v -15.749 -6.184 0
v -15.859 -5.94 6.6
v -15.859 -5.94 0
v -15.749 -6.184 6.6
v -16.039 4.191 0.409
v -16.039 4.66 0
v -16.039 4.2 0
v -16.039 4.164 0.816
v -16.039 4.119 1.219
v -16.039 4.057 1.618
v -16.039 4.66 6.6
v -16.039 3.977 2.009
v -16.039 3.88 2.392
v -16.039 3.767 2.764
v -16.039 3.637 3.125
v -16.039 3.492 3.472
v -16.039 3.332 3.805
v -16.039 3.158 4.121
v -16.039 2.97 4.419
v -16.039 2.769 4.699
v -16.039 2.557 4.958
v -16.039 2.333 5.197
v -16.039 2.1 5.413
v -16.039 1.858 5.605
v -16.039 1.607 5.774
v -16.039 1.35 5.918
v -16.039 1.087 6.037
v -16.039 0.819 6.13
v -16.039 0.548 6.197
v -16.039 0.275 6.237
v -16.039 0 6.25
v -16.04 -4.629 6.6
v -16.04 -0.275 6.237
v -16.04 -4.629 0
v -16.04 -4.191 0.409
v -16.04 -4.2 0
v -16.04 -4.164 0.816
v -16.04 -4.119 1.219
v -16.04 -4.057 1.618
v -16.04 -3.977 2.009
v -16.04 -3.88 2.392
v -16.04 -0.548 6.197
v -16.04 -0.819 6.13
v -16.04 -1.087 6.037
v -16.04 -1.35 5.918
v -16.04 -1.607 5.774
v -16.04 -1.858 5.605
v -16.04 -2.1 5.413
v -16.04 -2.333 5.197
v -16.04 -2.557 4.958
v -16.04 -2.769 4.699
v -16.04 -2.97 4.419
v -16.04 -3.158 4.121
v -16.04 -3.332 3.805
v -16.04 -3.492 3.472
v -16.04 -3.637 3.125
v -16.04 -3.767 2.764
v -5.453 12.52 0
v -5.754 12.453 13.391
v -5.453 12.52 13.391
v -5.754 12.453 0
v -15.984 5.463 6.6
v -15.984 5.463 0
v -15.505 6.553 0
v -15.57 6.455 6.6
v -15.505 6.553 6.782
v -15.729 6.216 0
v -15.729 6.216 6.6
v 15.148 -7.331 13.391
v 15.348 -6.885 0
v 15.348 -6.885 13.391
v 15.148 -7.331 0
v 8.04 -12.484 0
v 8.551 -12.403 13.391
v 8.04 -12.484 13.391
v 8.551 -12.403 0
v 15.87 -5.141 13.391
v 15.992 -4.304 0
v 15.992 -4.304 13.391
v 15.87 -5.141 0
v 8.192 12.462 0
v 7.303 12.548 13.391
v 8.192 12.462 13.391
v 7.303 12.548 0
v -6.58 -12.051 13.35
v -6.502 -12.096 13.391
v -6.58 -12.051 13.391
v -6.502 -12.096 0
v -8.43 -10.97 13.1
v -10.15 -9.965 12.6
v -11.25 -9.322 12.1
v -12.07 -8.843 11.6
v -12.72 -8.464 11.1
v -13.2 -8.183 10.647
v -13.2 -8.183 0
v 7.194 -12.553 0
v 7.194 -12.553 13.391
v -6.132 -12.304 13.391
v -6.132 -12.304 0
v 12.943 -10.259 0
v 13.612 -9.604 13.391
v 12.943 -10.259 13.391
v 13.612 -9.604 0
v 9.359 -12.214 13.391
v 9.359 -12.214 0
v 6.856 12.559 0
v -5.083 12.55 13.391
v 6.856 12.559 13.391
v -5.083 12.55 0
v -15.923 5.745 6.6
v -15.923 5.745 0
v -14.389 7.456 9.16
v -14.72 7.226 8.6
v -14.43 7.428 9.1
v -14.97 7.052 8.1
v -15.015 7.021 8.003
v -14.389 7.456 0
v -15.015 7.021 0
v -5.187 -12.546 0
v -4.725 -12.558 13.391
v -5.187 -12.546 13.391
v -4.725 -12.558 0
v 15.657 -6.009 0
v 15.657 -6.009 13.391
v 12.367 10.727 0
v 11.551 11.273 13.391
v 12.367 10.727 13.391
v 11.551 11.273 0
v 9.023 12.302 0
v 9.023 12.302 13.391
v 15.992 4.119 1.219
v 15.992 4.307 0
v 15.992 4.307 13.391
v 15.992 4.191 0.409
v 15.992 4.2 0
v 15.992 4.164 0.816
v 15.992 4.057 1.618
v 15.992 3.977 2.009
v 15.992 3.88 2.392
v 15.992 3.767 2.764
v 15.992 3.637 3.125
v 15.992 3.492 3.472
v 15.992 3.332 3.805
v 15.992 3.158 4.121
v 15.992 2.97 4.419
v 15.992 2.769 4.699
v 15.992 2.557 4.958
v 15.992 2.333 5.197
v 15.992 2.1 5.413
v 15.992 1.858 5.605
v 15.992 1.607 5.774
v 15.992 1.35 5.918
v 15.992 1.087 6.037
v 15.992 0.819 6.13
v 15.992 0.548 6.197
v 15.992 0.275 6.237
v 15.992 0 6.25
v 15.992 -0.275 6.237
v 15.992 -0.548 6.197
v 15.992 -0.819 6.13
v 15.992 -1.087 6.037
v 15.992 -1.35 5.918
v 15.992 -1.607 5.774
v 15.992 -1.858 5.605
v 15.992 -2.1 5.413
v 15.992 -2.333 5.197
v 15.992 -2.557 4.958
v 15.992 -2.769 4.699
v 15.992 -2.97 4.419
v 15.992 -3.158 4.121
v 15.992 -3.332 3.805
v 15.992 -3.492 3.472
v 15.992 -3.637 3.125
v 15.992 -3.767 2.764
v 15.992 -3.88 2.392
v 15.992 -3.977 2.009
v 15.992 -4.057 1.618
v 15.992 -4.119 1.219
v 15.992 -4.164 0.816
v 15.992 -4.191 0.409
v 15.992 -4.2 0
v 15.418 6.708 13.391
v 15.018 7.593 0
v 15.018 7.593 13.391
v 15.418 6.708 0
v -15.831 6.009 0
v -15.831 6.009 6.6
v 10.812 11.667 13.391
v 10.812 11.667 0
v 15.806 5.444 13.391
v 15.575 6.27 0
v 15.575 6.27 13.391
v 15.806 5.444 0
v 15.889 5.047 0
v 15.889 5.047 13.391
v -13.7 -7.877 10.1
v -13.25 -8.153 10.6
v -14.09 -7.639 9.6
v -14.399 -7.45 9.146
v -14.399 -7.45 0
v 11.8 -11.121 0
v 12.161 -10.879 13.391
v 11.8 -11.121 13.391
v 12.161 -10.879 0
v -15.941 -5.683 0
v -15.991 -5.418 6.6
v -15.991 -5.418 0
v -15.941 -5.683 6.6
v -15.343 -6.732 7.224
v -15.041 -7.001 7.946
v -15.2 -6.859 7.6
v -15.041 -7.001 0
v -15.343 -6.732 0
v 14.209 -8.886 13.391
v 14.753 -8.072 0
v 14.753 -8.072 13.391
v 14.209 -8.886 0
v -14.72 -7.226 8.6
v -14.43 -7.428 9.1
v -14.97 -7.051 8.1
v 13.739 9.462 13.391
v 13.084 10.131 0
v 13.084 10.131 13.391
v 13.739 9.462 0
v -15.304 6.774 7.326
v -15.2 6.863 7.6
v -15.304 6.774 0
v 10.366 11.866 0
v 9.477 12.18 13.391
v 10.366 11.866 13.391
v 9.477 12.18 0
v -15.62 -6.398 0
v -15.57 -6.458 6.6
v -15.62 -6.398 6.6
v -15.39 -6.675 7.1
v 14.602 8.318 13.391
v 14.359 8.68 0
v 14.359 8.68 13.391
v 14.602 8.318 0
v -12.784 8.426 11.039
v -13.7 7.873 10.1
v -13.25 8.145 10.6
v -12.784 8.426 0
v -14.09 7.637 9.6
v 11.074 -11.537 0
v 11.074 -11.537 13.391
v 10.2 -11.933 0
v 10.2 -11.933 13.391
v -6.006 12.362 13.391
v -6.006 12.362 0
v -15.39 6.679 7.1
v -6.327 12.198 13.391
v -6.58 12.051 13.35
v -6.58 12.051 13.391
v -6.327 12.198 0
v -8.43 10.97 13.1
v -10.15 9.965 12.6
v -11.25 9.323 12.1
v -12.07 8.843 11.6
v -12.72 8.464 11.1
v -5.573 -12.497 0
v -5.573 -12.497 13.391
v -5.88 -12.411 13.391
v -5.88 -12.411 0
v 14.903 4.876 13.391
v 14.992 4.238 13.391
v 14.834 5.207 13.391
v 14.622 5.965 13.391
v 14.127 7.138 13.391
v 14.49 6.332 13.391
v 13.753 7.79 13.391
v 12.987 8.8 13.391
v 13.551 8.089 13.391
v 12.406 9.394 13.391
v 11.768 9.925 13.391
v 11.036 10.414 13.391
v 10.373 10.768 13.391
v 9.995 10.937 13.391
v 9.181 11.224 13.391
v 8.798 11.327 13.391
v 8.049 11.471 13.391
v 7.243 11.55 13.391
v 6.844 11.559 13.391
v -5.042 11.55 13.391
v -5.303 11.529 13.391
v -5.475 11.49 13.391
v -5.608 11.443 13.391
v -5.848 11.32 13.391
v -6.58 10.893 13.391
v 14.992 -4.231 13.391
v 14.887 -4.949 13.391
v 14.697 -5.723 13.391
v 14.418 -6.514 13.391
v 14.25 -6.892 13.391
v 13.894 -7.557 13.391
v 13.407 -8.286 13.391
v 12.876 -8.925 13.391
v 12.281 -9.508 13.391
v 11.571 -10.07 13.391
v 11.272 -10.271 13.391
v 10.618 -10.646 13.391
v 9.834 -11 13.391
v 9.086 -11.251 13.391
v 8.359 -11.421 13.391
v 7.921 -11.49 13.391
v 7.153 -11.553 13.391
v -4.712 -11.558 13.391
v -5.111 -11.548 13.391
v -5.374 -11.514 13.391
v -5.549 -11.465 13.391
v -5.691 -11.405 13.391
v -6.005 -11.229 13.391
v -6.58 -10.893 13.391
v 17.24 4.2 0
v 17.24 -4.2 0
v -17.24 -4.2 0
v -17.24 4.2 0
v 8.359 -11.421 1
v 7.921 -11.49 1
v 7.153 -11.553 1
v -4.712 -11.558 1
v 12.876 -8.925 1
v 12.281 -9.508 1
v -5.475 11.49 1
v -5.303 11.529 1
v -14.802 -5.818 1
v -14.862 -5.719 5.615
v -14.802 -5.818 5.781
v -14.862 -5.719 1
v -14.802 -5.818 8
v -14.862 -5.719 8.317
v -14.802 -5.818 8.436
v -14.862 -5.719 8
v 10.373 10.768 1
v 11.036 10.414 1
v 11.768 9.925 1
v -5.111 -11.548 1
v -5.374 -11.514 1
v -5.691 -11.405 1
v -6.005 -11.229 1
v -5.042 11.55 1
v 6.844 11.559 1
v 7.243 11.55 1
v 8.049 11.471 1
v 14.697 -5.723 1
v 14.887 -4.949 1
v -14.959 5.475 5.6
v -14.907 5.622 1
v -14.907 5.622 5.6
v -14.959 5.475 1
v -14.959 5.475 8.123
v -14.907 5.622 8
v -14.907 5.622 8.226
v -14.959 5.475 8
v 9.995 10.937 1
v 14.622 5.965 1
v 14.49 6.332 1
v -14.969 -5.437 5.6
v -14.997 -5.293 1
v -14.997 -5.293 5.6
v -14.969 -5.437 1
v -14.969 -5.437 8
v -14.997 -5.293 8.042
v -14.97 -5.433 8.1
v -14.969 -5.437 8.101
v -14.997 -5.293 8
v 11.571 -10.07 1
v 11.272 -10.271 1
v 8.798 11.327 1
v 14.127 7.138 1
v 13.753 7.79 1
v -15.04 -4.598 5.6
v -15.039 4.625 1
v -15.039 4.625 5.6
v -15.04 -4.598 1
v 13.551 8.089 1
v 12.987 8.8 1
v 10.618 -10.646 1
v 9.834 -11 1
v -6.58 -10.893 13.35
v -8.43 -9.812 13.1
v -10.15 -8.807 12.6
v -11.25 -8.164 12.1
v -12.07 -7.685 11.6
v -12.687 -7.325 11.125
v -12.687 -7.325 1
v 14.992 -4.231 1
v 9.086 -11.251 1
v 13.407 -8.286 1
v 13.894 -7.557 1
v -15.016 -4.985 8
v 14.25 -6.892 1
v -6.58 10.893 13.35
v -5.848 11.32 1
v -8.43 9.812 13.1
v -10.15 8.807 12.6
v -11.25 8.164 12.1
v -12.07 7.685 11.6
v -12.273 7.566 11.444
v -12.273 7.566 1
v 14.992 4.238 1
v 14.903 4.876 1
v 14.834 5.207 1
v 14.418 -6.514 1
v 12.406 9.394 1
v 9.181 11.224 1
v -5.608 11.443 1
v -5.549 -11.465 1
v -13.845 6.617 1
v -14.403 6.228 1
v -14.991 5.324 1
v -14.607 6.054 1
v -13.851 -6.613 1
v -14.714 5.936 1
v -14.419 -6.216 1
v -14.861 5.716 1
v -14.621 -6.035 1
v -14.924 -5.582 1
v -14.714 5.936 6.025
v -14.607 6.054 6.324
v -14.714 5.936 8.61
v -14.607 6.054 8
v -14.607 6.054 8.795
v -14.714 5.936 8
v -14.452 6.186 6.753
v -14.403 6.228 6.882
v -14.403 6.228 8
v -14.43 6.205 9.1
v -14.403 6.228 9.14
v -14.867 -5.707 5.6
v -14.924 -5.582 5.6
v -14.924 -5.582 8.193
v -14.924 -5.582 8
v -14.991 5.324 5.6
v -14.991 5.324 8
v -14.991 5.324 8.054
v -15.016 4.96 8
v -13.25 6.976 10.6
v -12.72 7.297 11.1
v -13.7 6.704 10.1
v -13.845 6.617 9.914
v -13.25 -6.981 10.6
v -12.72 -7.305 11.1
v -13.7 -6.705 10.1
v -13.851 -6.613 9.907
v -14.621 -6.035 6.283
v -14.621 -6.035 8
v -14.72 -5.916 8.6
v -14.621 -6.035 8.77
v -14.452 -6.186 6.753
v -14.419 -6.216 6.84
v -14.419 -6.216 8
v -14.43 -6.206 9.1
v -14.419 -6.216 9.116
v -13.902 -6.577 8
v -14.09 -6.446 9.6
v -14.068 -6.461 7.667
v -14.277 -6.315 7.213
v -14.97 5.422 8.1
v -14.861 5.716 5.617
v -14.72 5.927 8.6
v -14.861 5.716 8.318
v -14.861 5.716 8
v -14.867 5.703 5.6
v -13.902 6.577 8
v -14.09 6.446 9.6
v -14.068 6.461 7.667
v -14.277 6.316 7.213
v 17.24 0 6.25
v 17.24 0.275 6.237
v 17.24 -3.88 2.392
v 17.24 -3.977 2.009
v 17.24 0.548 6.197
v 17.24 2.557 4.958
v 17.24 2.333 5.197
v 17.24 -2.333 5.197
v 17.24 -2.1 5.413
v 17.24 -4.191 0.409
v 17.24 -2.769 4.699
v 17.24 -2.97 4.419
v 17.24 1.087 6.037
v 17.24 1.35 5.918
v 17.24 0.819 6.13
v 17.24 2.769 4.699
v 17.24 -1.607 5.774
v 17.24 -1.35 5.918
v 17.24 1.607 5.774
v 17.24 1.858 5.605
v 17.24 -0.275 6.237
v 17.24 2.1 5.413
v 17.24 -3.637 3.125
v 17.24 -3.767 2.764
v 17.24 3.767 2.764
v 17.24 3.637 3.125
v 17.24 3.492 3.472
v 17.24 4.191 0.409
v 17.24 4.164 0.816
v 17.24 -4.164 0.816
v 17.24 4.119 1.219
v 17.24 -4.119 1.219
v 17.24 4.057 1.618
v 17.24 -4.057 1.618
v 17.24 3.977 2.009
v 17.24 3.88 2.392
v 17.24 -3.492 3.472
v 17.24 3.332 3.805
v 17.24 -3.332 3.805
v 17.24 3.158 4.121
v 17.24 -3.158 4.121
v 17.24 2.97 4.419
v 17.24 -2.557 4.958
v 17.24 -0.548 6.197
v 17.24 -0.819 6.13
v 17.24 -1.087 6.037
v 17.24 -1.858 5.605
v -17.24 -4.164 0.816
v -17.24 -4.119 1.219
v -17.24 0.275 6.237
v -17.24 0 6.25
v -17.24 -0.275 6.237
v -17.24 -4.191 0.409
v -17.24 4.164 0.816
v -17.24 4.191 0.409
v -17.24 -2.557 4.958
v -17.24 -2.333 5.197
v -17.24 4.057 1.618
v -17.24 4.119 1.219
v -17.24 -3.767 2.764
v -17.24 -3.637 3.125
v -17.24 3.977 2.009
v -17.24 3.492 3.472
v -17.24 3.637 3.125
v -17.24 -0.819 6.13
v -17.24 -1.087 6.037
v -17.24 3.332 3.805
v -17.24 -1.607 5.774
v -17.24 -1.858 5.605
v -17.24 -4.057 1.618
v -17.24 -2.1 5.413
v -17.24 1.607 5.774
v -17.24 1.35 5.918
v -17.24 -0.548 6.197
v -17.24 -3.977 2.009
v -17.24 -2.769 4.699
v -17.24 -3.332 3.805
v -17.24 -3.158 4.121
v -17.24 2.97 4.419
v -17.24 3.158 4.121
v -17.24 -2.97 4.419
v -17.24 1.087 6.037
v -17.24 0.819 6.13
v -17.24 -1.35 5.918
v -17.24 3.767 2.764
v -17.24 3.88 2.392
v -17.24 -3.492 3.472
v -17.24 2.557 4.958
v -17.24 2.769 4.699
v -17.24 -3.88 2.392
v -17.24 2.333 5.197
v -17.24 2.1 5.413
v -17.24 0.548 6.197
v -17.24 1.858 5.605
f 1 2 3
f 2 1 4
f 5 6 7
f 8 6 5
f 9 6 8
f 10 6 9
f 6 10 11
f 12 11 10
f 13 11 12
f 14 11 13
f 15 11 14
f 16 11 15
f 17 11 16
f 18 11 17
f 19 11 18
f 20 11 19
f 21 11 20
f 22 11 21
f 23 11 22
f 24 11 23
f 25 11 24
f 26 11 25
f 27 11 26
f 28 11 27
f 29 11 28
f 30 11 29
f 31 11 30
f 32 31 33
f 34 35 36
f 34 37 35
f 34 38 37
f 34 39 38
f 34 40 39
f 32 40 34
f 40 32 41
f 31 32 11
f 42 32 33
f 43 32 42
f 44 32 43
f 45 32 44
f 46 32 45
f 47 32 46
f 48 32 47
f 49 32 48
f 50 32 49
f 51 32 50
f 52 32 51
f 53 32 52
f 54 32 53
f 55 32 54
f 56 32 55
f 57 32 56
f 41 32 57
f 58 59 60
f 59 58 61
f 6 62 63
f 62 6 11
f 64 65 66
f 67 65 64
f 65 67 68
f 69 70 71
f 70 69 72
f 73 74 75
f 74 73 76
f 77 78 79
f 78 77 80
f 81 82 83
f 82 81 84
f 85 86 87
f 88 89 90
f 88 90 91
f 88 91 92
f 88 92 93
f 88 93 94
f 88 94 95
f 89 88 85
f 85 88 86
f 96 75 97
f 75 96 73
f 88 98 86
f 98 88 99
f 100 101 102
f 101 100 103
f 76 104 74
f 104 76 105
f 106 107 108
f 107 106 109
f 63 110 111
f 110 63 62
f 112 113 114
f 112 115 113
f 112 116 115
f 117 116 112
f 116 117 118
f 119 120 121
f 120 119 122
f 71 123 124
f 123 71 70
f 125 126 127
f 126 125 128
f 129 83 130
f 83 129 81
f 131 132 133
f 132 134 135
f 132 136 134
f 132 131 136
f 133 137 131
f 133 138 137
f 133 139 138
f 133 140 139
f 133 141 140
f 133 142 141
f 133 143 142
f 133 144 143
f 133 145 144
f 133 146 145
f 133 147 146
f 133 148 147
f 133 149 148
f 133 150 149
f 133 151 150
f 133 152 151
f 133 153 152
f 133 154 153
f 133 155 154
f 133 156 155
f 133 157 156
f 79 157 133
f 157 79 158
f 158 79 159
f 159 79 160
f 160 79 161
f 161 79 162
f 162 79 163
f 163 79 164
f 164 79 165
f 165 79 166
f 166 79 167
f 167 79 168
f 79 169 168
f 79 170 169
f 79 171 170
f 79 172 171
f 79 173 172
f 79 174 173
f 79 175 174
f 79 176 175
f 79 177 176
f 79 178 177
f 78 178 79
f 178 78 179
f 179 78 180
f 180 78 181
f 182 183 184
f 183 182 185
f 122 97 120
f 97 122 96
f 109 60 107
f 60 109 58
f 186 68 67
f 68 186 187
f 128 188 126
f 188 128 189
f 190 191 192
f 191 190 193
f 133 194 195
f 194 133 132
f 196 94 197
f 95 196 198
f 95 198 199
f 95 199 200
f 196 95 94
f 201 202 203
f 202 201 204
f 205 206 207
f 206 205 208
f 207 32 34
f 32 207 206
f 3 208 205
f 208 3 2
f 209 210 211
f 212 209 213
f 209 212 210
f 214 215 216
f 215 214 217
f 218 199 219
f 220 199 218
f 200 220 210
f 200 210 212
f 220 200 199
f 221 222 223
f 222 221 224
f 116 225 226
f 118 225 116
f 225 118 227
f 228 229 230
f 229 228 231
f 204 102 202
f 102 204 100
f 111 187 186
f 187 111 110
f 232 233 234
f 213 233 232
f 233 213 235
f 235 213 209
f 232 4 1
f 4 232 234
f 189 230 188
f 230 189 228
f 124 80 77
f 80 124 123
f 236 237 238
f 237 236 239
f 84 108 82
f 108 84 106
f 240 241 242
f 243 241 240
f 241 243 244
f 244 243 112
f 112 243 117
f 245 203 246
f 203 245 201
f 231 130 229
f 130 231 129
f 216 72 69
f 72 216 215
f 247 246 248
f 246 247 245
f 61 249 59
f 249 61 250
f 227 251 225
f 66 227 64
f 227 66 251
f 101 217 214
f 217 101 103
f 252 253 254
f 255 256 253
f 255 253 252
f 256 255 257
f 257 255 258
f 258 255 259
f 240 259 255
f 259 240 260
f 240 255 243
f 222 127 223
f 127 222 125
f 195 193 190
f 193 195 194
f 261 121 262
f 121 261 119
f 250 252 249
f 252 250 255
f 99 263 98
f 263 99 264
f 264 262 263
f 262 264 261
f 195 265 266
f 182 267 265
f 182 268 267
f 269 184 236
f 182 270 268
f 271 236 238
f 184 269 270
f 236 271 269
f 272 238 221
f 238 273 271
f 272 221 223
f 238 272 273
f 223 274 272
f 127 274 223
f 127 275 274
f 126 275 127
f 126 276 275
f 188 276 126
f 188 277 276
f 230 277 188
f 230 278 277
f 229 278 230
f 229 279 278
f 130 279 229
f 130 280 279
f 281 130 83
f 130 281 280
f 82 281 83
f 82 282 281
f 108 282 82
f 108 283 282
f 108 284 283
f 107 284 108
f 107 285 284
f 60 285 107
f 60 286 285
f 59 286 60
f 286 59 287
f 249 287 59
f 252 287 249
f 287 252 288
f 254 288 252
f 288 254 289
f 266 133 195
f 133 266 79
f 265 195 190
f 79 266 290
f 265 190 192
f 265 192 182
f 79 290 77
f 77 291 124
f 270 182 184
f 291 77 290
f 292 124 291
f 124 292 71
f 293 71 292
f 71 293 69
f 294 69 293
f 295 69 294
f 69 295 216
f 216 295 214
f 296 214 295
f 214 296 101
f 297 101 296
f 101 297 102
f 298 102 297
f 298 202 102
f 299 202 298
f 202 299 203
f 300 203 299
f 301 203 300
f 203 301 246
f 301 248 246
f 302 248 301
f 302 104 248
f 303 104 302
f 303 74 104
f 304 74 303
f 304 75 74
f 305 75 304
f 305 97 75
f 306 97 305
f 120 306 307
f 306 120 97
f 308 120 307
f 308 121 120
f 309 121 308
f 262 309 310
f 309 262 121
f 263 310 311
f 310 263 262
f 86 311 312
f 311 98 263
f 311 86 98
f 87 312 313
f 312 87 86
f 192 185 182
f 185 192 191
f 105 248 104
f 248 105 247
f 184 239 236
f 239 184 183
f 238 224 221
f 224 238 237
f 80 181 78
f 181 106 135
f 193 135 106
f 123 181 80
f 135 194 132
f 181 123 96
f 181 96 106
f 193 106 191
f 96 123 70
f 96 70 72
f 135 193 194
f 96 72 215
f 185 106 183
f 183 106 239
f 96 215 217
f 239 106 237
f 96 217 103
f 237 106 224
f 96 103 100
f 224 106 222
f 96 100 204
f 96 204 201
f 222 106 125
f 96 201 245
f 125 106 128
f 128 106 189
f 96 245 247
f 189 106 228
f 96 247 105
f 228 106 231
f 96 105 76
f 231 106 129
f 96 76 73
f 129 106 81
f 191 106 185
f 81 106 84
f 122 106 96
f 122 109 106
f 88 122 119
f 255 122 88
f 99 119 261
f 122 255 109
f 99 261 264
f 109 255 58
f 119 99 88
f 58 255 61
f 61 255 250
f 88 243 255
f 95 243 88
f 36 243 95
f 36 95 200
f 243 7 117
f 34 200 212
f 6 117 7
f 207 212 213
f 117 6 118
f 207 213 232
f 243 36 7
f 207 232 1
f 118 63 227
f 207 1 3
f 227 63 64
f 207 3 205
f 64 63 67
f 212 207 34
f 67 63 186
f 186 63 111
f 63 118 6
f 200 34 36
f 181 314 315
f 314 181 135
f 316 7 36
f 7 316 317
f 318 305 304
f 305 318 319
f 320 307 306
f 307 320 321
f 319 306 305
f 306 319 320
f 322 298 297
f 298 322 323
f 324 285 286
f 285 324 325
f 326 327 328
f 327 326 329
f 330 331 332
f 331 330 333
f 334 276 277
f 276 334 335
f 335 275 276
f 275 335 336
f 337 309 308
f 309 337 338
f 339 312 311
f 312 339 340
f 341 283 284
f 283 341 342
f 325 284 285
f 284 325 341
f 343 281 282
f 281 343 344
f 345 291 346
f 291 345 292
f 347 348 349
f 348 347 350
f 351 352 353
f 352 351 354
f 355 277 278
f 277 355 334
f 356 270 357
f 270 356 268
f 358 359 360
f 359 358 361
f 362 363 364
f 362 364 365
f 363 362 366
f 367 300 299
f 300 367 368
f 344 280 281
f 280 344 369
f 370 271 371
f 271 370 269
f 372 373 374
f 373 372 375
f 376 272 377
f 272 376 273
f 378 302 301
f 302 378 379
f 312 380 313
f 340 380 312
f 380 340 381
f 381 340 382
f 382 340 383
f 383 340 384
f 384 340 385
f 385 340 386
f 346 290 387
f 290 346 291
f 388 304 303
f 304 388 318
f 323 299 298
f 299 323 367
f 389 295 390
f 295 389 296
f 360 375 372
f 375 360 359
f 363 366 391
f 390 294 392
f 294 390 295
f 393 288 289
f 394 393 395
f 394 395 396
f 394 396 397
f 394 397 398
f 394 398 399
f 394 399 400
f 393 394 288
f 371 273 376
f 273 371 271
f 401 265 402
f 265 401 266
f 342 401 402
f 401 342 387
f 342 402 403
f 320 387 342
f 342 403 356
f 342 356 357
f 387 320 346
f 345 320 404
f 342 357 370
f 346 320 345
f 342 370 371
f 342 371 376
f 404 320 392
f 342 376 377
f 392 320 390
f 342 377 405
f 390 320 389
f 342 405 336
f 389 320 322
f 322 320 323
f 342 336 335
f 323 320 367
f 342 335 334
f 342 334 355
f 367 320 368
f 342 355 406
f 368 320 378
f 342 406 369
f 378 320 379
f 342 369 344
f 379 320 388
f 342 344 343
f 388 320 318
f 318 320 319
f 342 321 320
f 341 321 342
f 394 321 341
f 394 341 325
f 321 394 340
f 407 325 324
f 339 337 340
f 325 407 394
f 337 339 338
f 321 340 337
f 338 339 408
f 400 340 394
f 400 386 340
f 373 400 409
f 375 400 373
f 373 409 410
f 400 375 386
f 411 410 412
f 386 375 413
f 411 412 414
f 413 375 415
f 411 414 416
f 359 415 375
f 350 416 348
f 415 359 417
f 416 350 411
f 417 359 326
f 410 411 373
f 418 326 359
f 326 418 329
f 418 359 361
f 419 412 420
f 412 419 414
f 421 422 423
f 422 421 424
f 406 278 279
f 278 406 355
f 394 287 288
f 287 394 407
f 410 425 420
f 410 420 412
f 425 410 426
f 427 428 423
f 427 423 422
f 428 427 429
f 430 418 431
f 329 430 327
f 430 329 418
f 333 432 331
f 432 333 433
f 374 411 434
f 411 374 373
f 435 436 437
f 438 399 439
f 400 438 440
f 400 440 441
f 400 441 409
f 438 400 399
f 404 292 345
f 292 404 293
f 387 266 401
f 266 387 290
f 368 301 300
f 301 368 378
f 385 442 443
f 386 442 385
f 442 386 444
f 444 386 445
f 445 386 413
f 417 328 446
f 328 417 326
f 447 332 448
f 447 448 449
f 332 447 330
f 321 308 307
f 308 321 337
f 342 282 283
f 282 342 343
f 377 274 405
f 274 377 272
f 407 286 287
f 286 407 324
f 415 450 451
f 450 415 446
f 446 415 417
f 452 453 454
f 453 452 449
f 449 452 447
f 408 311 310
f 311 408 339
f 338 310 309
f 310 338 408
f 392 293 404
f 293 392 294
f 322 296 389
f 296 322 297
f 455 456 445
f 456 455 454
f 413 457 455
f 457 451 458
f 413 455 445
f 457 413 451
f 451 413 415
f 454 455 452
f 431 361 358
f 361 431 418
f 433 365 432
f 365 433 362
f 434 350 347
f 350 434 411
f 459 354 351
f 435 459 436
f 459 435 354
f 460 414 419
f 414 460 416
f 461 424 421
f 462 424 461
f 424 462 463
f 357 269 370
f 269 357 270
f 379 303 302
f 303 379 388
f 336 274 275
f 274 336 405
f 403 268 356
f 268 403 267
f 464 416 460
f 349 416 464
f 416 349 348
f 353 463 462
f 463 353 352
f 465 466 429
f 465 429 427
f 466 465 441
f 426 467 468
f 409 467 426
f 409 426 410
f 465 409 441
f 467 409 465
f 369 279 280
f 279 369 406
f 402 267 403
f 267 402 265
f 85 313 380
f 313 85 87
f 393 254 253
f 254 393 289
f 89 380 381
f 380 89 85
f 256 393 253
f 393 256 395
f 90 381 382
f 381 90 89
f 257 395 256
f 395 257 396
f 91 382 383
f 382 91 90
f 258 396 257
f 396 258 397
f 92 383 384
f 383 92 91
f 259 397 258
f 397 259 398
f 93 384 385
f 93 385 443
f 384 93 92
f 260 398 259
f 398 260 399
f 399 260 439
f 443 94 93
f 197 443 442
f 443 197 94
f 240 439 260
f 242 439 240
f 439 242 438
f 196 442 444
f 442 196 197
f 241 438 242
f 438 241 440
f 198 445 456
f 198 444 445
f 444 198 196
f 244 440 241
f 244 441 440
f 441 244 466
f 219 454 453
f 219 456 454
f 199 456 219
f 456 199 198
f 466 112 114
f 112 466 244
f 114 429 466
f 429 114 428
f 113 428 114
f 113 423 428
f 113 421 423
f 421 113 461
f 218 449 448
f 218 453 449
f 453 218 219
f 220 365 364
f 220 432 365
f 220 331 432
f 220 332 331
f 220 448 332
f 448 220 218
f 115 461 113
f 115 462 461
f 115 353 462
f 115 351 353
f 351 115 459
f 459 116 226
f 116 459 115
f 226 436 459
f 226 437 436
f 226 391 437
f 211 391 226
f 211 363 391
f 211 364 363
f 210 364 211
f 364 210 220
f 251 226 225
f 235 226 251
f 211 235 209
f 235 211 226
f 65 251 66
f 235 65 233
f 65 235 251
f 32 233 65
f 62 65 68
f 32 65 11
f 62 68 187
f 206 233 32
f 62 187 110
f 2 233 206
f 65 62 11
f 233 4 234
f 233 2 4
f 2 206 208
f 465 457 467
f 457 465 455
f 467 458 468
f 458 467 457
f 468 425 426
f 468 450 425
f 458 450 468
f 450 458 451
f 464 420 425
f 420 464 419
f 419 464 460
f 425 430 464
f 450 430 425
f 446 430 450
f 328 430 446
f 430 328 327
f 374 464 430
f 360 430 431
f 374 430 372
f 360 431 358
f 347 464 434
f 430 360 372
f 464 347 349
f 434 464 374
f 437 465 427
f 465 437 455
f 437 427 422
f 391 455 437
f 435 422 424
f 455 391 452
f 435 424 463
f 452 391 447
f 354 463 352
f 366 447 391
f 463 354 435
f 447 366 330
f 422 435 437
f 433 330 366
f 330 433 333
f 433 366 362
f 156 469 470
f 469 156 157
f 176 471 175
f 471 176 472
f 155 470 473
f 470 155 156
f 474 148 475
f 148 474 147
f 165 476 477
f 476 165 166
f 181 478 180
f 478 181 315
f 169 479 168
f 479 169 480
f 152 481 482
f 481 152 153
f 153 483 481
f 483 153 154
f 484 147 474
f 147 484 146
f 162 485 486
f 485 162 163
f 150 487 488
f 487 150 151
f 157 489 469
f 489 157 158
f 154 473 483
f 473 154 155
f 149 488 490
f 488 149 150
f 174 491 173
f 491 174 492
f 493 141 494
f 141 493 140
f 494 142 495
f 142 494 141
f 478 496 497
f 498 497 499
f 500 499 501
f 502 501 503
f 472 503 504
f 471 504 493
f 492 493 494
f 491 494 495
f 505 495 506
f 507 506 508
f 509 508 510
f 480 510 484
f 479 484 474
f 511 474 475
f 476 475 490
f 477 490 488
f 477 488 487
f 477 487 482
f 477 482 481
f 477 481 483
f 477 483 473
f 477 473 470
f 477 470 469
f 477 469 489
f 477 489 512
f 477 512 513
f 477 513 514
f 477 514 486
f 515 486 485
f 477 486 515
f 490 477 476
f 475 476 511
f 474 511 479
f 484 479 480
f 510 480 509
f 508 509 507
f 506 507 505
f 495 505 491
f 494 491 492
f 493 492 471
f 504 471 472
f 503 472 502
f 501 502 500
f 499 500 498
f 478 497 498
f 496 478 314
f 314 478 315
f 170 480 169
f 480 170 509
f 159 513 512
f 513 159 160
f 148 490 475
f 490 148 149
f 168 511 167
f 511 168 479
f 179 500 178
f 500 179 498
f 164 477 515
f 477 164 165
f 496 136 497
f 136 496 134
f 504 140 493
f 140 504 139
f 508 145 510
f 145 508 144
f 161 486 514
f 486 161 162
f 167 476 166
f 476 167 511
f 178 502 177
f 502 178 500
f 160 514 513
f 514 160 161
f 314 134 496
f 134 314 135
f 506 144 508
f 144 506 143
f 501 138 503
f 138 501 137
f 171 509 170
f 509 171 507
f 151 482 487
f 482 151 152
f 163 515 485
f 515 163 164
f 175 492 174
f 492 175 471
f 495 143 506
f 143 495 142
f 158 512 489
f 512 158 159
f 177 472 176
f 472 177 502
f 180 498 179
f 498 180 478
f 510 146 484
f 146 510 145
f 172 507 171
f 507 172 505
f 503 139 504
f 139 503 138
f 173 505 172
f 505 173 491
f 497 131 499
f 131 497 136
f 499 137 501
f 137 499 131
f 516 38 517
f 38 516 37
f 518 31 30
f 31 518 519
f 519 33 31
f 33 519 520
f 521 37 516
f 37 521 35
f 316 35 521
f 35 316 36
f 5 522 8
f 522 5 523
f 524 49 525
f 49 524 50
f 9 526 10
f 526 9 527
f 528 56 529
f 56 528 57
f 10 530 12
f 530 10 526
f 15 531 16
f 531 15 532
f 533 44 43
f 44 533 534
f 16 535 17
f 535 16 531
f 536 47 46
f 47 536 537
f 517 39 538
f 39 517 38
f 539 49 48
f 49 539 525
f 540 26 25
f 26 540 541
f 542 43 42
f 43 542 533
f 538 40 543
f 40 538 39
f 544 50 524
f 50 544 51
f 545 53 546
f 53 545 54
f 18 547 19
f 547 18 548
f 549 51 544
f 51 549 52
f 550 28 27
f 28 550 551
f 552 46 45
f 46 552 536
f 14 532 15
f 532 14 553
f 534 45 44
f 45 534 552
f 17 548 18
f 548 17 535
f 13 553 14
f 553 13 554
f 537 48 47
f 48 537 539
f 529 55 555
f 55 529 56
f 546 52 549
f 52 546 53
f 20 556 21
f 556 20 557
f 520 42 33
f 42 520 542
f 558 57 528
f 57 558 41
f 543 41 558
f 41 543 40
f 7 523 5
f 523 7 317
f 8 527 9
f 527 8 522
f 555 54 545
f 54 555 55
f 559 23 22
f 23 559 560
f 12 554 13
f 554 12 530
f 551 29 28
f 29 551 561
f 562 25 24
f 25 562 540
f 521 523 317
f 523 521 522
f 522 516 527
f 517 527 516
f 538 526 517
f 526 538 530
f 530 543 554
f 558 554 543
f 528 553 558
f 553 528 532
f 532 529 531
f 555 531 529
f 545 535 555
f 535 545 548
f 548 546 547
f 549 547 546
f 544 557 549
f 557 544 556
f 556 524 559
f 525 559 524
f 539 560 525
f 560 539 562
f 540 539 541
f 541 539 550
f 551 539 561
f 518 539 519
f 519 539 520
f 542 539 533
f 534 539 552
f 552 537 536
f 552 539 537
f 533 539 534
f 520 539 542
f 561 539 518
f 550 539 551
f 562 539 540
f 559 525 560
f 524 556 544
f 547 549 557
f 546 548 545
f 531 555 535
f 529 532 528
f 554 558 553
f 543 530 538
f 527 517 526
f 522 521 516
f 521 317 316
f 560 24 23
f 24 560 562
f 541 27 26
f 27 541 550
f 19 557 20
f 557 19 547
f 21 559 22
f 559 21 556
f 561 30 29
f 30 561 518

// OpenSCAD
// 11 - Honeycomb - topminibox - top: static OpenSCAD reconstruction (lid that slides into the topminibox box).
//
// Adapted from "Onz" by sez16sez (Thingiverse): https://www.thingiverse.com/thing:2739061
// Licensed CC BY-NC 4.0 (https://creativecommons.org/licenses/by-nc/4.0/). This file is a derivative reconstruction of
// the design's STL (11_-_Honeycomb_-_topminibox_-_top.stl) made for CanFactory: same attribution, same non-commercial
// terms, no additional rights to the original. See ../ATTRIBUTION.md.
//
// Geometry: the box's D-shaped plan mirrored in X and pulled in by the sliding clearance, as a 1 mm shell with a 1 mm
// cap at z = 0 (the lid is modelled as printed, cap down). The -X (chamfered) end is swept away by a curved profile and its
// end sheet stops at SHEET_TOP; a half-ellipse pad on each end (a detent for the box notch) stands on the cap.
// Units are millimetres; the part is centred on the Z axis with the cap's underside on z = 0. The source STL sat at
// (244.0, -84.8) on the print plate. Named dimensions only; the one parameter is SNAP (default
// "friction" is the reconstruction as verified).

SCALE     = 1;
ROUNDNESS = 96;

HEIGHT = 13.391;      // rim height
WALL   = 1;           // wall and cap thickness
CLEARANCE = 1.2;      // gap between the box's outer wall and this lid's outer wall (the box's wall + 0.2)

// Box plan outline (x, y) about the box centre: rounded -X end, chamfered +X end. The lid uses it mirrored and inset.
BOX_PLAN = [[16.982, -6.369], [17.106, -5.977], [17.184, -5.568], [17.24, -4.666], [17.239, 4.701], [17.175, 5.631], [17.081,
        6.07], [16.94, 6.474], [16.771, 6.817], [16.453, 7.294], [16.141, 7.637], [15.749, 7.972], [15.043, 8.463],
        [13.397, 9.458], [6.903, 13.252], [6.483, 13.466], [6.088, 13.608], [5.633, 13.709], [5.133, 13.75], [-6.87,
        13.759], [-7.375, 13.747], [-8.364, 13.651], [-9.292, 13.472], [-9.833, 13.327], [-10.81, 12.982], [-11.34,
        12.746], [-12.169, 12.303], [-13.086, 11.69], [-13.899, 11.014], [-14.64, 10.257], [-15.329, 9.388], [-15.622,
        8.952], [-16.088, 8.14], [-16.531, 7.158], [-16.719, 6.635], [-16.973, 5.728], [-17.072, 5.252], [-17.192,
        4.39], [-17.192, -4.391], [-17.049, -5.371], [-16.808, -6.353], [-16.463, -7.33], [-16.227, -7.859], [-15.784,
        -8.689], [-15.172, -9.605], [-14.495, -10.418], [-13.738, -11.16], [-12.869, -11.849], [-12.433, -12.141],
        [-11.621, -12.607], [-10.639, -13.051], [-9.687, -13.37], [-8.781, -13.582], [-8.182, -13.676], [-7.244,
        -13.753], [4.741, -13.758], [5.279, -13.744], [5.812, -13.676], [6.277, -13.546], [6.662, -13.383], [7.098,
        -13.138], [13.816, -9.213], [15.056, -8.455], [15.787, -7.944], [16.209, -7.567], [16.601, -7.095], [16.813,
        -6.743]];

// Outer surface of the swept -X end: [x, z] pairs; everything to the -X side of this curve is removed.
END_CURVE = [[-15.57, 6.6], [-15.39, 7.1], [-15.2, 7.6], [-14.97, 8.1], [-14.72, 8.6], [-14.43, 9.1], [-14.09, 9.6], [-13.7,
        10.1], [-13.25, 10.6], [-12.72, 11.1], [-12.07, 11.6], [-11.25, 12.1], [-10.15, 12.6], [-8.43, 13.1], [-6.58,
        13.35]];
END_LOW_X = -16.04;   // x of the curve below its first pair
SHEET_TOP = 8;        // the swept end sheet is removed above this height (the ring walls keep following the curve)

// Detent pads: half-ellipses in the (y, z) plane standing on the cap, at both ends, out to PAD_X.
PAD_A = 4.2;          // half-width along Y
PAD_C = 6.25;         // height
PAD_X = 17.24;
PAD_IN_X = 15.5;      // pad reaches this far towards the centre so it overlaps the wall

// Snap mechanism, chosen by SNAP (a -D override): "friction" (the original geometry, nothing added), "detent", "clip",
// "magnet" or "crush-ribs". The end pads above already latch into the box's notches, so they stay in every mode; only
// "crush-ribs" adds anything: three ribs on each straight side wall, squeezed by the box's wall.
SNAP = "friction";
LID_Y = 12.55;        // outer face of the straight side walls (the box's inner face is 0.2 further out)
CRUSH_H = 0.3;
CRUSH_X = [-2, 1.5, 5];
CRUSH_W = 0.5;
CRUSH_Z0 = 2;
CRUSH_Z1 = 13.2;      // the rim end is ramped so the box finds the ribs

module crush_ribs() {
  for (x = CRUSH_X, m = [0, 1]) mirror([0, m, 0]) translate([x - CRUSH_W / 2, 0, 0]) rotate([90, 0, 90]) linear_extrude(height = CRUSH_W)
    polygon([[LID_Y - 0.3, CRUSH_Z0], [LID_Y + CRUSH_H, CRUSH_Z0], [LID_Y + CRUSH_H, CRUSH_Z1 - 1.4], [LID_Y, CRUSH_Z1], [LID_Y - 0.3, CRUSH_Z1]]);
}

HEADROOM = 10;
module lid_plan() { mirror([1, 0]) offset(delta = -CLEARANCE) polygon(BOX_PLAN); }

// Region kept above the swept end, in the (x, z) plane, open at the top so that insetting it does not create a lid.
module keep_region() {
  polygon(concat([[END_LOW_X, -HEADROOM], [END_LOW_X, END_CURVE[0][1]]], END_CURVE, [[END_CURVE[len(END_CURVE) - 1][0], HEIGHT + HEADROOM], [30, HEIGHT + HEADROOM], [30, -HEADROOM]]));
}

module across_y(len) rotate([90, 0, 0]) linear_extrude(height = len, center = true) children();

module pad() {   // toward +X; mirror for the other end
  translate([PAD_IN_X, 0, 0]) rotate([90, 0, 90]) linear_extrude(height = PAD_X - PAD_IN_X)
    intersection() { scale([PAD_A, PAD_C]) circle(r = 1, $fn = ROUNDNESS); translate([-PAD_A, 0]) square([2 * PAD_A, PAD_C]); }
}

module topminibox_top() {
  // walls follow the curve all the way up; the swept sheet exists only below SHEET_TOP
  union() {
    intersection() {
      difference() {
        linear_extrude(height = HEIGHT) lid_plan();
        translate([0, 0, WALL]) linear_extrude(height = HEIGHT) offset(delta = -WALL) lid_plan();
      }
      across_y(40) keep_region();
    }
    intersection() {
      difference() {
        intersection() { linear_extrude(height = HEIGHT) lid_plan(); across_y(40) keep_region(); }
        intersection() {
          translate([0, 0, WALL]) linear_extrude(height = HEIGHT) offset(delta = -WALL) lid_plan();
          across_y(40) offset(delta = -WALL) keep_region();
        }
      }
      translate([-30, -30, 0]) cube([60, 60, SHEET_TOP]);
    }
    pad();
    mirror([1, 0, 0]) pad();
    if (SNAP == "crush-ribs") crush_ribs();
  }
}

scale(SCALE) topminibox_top();
